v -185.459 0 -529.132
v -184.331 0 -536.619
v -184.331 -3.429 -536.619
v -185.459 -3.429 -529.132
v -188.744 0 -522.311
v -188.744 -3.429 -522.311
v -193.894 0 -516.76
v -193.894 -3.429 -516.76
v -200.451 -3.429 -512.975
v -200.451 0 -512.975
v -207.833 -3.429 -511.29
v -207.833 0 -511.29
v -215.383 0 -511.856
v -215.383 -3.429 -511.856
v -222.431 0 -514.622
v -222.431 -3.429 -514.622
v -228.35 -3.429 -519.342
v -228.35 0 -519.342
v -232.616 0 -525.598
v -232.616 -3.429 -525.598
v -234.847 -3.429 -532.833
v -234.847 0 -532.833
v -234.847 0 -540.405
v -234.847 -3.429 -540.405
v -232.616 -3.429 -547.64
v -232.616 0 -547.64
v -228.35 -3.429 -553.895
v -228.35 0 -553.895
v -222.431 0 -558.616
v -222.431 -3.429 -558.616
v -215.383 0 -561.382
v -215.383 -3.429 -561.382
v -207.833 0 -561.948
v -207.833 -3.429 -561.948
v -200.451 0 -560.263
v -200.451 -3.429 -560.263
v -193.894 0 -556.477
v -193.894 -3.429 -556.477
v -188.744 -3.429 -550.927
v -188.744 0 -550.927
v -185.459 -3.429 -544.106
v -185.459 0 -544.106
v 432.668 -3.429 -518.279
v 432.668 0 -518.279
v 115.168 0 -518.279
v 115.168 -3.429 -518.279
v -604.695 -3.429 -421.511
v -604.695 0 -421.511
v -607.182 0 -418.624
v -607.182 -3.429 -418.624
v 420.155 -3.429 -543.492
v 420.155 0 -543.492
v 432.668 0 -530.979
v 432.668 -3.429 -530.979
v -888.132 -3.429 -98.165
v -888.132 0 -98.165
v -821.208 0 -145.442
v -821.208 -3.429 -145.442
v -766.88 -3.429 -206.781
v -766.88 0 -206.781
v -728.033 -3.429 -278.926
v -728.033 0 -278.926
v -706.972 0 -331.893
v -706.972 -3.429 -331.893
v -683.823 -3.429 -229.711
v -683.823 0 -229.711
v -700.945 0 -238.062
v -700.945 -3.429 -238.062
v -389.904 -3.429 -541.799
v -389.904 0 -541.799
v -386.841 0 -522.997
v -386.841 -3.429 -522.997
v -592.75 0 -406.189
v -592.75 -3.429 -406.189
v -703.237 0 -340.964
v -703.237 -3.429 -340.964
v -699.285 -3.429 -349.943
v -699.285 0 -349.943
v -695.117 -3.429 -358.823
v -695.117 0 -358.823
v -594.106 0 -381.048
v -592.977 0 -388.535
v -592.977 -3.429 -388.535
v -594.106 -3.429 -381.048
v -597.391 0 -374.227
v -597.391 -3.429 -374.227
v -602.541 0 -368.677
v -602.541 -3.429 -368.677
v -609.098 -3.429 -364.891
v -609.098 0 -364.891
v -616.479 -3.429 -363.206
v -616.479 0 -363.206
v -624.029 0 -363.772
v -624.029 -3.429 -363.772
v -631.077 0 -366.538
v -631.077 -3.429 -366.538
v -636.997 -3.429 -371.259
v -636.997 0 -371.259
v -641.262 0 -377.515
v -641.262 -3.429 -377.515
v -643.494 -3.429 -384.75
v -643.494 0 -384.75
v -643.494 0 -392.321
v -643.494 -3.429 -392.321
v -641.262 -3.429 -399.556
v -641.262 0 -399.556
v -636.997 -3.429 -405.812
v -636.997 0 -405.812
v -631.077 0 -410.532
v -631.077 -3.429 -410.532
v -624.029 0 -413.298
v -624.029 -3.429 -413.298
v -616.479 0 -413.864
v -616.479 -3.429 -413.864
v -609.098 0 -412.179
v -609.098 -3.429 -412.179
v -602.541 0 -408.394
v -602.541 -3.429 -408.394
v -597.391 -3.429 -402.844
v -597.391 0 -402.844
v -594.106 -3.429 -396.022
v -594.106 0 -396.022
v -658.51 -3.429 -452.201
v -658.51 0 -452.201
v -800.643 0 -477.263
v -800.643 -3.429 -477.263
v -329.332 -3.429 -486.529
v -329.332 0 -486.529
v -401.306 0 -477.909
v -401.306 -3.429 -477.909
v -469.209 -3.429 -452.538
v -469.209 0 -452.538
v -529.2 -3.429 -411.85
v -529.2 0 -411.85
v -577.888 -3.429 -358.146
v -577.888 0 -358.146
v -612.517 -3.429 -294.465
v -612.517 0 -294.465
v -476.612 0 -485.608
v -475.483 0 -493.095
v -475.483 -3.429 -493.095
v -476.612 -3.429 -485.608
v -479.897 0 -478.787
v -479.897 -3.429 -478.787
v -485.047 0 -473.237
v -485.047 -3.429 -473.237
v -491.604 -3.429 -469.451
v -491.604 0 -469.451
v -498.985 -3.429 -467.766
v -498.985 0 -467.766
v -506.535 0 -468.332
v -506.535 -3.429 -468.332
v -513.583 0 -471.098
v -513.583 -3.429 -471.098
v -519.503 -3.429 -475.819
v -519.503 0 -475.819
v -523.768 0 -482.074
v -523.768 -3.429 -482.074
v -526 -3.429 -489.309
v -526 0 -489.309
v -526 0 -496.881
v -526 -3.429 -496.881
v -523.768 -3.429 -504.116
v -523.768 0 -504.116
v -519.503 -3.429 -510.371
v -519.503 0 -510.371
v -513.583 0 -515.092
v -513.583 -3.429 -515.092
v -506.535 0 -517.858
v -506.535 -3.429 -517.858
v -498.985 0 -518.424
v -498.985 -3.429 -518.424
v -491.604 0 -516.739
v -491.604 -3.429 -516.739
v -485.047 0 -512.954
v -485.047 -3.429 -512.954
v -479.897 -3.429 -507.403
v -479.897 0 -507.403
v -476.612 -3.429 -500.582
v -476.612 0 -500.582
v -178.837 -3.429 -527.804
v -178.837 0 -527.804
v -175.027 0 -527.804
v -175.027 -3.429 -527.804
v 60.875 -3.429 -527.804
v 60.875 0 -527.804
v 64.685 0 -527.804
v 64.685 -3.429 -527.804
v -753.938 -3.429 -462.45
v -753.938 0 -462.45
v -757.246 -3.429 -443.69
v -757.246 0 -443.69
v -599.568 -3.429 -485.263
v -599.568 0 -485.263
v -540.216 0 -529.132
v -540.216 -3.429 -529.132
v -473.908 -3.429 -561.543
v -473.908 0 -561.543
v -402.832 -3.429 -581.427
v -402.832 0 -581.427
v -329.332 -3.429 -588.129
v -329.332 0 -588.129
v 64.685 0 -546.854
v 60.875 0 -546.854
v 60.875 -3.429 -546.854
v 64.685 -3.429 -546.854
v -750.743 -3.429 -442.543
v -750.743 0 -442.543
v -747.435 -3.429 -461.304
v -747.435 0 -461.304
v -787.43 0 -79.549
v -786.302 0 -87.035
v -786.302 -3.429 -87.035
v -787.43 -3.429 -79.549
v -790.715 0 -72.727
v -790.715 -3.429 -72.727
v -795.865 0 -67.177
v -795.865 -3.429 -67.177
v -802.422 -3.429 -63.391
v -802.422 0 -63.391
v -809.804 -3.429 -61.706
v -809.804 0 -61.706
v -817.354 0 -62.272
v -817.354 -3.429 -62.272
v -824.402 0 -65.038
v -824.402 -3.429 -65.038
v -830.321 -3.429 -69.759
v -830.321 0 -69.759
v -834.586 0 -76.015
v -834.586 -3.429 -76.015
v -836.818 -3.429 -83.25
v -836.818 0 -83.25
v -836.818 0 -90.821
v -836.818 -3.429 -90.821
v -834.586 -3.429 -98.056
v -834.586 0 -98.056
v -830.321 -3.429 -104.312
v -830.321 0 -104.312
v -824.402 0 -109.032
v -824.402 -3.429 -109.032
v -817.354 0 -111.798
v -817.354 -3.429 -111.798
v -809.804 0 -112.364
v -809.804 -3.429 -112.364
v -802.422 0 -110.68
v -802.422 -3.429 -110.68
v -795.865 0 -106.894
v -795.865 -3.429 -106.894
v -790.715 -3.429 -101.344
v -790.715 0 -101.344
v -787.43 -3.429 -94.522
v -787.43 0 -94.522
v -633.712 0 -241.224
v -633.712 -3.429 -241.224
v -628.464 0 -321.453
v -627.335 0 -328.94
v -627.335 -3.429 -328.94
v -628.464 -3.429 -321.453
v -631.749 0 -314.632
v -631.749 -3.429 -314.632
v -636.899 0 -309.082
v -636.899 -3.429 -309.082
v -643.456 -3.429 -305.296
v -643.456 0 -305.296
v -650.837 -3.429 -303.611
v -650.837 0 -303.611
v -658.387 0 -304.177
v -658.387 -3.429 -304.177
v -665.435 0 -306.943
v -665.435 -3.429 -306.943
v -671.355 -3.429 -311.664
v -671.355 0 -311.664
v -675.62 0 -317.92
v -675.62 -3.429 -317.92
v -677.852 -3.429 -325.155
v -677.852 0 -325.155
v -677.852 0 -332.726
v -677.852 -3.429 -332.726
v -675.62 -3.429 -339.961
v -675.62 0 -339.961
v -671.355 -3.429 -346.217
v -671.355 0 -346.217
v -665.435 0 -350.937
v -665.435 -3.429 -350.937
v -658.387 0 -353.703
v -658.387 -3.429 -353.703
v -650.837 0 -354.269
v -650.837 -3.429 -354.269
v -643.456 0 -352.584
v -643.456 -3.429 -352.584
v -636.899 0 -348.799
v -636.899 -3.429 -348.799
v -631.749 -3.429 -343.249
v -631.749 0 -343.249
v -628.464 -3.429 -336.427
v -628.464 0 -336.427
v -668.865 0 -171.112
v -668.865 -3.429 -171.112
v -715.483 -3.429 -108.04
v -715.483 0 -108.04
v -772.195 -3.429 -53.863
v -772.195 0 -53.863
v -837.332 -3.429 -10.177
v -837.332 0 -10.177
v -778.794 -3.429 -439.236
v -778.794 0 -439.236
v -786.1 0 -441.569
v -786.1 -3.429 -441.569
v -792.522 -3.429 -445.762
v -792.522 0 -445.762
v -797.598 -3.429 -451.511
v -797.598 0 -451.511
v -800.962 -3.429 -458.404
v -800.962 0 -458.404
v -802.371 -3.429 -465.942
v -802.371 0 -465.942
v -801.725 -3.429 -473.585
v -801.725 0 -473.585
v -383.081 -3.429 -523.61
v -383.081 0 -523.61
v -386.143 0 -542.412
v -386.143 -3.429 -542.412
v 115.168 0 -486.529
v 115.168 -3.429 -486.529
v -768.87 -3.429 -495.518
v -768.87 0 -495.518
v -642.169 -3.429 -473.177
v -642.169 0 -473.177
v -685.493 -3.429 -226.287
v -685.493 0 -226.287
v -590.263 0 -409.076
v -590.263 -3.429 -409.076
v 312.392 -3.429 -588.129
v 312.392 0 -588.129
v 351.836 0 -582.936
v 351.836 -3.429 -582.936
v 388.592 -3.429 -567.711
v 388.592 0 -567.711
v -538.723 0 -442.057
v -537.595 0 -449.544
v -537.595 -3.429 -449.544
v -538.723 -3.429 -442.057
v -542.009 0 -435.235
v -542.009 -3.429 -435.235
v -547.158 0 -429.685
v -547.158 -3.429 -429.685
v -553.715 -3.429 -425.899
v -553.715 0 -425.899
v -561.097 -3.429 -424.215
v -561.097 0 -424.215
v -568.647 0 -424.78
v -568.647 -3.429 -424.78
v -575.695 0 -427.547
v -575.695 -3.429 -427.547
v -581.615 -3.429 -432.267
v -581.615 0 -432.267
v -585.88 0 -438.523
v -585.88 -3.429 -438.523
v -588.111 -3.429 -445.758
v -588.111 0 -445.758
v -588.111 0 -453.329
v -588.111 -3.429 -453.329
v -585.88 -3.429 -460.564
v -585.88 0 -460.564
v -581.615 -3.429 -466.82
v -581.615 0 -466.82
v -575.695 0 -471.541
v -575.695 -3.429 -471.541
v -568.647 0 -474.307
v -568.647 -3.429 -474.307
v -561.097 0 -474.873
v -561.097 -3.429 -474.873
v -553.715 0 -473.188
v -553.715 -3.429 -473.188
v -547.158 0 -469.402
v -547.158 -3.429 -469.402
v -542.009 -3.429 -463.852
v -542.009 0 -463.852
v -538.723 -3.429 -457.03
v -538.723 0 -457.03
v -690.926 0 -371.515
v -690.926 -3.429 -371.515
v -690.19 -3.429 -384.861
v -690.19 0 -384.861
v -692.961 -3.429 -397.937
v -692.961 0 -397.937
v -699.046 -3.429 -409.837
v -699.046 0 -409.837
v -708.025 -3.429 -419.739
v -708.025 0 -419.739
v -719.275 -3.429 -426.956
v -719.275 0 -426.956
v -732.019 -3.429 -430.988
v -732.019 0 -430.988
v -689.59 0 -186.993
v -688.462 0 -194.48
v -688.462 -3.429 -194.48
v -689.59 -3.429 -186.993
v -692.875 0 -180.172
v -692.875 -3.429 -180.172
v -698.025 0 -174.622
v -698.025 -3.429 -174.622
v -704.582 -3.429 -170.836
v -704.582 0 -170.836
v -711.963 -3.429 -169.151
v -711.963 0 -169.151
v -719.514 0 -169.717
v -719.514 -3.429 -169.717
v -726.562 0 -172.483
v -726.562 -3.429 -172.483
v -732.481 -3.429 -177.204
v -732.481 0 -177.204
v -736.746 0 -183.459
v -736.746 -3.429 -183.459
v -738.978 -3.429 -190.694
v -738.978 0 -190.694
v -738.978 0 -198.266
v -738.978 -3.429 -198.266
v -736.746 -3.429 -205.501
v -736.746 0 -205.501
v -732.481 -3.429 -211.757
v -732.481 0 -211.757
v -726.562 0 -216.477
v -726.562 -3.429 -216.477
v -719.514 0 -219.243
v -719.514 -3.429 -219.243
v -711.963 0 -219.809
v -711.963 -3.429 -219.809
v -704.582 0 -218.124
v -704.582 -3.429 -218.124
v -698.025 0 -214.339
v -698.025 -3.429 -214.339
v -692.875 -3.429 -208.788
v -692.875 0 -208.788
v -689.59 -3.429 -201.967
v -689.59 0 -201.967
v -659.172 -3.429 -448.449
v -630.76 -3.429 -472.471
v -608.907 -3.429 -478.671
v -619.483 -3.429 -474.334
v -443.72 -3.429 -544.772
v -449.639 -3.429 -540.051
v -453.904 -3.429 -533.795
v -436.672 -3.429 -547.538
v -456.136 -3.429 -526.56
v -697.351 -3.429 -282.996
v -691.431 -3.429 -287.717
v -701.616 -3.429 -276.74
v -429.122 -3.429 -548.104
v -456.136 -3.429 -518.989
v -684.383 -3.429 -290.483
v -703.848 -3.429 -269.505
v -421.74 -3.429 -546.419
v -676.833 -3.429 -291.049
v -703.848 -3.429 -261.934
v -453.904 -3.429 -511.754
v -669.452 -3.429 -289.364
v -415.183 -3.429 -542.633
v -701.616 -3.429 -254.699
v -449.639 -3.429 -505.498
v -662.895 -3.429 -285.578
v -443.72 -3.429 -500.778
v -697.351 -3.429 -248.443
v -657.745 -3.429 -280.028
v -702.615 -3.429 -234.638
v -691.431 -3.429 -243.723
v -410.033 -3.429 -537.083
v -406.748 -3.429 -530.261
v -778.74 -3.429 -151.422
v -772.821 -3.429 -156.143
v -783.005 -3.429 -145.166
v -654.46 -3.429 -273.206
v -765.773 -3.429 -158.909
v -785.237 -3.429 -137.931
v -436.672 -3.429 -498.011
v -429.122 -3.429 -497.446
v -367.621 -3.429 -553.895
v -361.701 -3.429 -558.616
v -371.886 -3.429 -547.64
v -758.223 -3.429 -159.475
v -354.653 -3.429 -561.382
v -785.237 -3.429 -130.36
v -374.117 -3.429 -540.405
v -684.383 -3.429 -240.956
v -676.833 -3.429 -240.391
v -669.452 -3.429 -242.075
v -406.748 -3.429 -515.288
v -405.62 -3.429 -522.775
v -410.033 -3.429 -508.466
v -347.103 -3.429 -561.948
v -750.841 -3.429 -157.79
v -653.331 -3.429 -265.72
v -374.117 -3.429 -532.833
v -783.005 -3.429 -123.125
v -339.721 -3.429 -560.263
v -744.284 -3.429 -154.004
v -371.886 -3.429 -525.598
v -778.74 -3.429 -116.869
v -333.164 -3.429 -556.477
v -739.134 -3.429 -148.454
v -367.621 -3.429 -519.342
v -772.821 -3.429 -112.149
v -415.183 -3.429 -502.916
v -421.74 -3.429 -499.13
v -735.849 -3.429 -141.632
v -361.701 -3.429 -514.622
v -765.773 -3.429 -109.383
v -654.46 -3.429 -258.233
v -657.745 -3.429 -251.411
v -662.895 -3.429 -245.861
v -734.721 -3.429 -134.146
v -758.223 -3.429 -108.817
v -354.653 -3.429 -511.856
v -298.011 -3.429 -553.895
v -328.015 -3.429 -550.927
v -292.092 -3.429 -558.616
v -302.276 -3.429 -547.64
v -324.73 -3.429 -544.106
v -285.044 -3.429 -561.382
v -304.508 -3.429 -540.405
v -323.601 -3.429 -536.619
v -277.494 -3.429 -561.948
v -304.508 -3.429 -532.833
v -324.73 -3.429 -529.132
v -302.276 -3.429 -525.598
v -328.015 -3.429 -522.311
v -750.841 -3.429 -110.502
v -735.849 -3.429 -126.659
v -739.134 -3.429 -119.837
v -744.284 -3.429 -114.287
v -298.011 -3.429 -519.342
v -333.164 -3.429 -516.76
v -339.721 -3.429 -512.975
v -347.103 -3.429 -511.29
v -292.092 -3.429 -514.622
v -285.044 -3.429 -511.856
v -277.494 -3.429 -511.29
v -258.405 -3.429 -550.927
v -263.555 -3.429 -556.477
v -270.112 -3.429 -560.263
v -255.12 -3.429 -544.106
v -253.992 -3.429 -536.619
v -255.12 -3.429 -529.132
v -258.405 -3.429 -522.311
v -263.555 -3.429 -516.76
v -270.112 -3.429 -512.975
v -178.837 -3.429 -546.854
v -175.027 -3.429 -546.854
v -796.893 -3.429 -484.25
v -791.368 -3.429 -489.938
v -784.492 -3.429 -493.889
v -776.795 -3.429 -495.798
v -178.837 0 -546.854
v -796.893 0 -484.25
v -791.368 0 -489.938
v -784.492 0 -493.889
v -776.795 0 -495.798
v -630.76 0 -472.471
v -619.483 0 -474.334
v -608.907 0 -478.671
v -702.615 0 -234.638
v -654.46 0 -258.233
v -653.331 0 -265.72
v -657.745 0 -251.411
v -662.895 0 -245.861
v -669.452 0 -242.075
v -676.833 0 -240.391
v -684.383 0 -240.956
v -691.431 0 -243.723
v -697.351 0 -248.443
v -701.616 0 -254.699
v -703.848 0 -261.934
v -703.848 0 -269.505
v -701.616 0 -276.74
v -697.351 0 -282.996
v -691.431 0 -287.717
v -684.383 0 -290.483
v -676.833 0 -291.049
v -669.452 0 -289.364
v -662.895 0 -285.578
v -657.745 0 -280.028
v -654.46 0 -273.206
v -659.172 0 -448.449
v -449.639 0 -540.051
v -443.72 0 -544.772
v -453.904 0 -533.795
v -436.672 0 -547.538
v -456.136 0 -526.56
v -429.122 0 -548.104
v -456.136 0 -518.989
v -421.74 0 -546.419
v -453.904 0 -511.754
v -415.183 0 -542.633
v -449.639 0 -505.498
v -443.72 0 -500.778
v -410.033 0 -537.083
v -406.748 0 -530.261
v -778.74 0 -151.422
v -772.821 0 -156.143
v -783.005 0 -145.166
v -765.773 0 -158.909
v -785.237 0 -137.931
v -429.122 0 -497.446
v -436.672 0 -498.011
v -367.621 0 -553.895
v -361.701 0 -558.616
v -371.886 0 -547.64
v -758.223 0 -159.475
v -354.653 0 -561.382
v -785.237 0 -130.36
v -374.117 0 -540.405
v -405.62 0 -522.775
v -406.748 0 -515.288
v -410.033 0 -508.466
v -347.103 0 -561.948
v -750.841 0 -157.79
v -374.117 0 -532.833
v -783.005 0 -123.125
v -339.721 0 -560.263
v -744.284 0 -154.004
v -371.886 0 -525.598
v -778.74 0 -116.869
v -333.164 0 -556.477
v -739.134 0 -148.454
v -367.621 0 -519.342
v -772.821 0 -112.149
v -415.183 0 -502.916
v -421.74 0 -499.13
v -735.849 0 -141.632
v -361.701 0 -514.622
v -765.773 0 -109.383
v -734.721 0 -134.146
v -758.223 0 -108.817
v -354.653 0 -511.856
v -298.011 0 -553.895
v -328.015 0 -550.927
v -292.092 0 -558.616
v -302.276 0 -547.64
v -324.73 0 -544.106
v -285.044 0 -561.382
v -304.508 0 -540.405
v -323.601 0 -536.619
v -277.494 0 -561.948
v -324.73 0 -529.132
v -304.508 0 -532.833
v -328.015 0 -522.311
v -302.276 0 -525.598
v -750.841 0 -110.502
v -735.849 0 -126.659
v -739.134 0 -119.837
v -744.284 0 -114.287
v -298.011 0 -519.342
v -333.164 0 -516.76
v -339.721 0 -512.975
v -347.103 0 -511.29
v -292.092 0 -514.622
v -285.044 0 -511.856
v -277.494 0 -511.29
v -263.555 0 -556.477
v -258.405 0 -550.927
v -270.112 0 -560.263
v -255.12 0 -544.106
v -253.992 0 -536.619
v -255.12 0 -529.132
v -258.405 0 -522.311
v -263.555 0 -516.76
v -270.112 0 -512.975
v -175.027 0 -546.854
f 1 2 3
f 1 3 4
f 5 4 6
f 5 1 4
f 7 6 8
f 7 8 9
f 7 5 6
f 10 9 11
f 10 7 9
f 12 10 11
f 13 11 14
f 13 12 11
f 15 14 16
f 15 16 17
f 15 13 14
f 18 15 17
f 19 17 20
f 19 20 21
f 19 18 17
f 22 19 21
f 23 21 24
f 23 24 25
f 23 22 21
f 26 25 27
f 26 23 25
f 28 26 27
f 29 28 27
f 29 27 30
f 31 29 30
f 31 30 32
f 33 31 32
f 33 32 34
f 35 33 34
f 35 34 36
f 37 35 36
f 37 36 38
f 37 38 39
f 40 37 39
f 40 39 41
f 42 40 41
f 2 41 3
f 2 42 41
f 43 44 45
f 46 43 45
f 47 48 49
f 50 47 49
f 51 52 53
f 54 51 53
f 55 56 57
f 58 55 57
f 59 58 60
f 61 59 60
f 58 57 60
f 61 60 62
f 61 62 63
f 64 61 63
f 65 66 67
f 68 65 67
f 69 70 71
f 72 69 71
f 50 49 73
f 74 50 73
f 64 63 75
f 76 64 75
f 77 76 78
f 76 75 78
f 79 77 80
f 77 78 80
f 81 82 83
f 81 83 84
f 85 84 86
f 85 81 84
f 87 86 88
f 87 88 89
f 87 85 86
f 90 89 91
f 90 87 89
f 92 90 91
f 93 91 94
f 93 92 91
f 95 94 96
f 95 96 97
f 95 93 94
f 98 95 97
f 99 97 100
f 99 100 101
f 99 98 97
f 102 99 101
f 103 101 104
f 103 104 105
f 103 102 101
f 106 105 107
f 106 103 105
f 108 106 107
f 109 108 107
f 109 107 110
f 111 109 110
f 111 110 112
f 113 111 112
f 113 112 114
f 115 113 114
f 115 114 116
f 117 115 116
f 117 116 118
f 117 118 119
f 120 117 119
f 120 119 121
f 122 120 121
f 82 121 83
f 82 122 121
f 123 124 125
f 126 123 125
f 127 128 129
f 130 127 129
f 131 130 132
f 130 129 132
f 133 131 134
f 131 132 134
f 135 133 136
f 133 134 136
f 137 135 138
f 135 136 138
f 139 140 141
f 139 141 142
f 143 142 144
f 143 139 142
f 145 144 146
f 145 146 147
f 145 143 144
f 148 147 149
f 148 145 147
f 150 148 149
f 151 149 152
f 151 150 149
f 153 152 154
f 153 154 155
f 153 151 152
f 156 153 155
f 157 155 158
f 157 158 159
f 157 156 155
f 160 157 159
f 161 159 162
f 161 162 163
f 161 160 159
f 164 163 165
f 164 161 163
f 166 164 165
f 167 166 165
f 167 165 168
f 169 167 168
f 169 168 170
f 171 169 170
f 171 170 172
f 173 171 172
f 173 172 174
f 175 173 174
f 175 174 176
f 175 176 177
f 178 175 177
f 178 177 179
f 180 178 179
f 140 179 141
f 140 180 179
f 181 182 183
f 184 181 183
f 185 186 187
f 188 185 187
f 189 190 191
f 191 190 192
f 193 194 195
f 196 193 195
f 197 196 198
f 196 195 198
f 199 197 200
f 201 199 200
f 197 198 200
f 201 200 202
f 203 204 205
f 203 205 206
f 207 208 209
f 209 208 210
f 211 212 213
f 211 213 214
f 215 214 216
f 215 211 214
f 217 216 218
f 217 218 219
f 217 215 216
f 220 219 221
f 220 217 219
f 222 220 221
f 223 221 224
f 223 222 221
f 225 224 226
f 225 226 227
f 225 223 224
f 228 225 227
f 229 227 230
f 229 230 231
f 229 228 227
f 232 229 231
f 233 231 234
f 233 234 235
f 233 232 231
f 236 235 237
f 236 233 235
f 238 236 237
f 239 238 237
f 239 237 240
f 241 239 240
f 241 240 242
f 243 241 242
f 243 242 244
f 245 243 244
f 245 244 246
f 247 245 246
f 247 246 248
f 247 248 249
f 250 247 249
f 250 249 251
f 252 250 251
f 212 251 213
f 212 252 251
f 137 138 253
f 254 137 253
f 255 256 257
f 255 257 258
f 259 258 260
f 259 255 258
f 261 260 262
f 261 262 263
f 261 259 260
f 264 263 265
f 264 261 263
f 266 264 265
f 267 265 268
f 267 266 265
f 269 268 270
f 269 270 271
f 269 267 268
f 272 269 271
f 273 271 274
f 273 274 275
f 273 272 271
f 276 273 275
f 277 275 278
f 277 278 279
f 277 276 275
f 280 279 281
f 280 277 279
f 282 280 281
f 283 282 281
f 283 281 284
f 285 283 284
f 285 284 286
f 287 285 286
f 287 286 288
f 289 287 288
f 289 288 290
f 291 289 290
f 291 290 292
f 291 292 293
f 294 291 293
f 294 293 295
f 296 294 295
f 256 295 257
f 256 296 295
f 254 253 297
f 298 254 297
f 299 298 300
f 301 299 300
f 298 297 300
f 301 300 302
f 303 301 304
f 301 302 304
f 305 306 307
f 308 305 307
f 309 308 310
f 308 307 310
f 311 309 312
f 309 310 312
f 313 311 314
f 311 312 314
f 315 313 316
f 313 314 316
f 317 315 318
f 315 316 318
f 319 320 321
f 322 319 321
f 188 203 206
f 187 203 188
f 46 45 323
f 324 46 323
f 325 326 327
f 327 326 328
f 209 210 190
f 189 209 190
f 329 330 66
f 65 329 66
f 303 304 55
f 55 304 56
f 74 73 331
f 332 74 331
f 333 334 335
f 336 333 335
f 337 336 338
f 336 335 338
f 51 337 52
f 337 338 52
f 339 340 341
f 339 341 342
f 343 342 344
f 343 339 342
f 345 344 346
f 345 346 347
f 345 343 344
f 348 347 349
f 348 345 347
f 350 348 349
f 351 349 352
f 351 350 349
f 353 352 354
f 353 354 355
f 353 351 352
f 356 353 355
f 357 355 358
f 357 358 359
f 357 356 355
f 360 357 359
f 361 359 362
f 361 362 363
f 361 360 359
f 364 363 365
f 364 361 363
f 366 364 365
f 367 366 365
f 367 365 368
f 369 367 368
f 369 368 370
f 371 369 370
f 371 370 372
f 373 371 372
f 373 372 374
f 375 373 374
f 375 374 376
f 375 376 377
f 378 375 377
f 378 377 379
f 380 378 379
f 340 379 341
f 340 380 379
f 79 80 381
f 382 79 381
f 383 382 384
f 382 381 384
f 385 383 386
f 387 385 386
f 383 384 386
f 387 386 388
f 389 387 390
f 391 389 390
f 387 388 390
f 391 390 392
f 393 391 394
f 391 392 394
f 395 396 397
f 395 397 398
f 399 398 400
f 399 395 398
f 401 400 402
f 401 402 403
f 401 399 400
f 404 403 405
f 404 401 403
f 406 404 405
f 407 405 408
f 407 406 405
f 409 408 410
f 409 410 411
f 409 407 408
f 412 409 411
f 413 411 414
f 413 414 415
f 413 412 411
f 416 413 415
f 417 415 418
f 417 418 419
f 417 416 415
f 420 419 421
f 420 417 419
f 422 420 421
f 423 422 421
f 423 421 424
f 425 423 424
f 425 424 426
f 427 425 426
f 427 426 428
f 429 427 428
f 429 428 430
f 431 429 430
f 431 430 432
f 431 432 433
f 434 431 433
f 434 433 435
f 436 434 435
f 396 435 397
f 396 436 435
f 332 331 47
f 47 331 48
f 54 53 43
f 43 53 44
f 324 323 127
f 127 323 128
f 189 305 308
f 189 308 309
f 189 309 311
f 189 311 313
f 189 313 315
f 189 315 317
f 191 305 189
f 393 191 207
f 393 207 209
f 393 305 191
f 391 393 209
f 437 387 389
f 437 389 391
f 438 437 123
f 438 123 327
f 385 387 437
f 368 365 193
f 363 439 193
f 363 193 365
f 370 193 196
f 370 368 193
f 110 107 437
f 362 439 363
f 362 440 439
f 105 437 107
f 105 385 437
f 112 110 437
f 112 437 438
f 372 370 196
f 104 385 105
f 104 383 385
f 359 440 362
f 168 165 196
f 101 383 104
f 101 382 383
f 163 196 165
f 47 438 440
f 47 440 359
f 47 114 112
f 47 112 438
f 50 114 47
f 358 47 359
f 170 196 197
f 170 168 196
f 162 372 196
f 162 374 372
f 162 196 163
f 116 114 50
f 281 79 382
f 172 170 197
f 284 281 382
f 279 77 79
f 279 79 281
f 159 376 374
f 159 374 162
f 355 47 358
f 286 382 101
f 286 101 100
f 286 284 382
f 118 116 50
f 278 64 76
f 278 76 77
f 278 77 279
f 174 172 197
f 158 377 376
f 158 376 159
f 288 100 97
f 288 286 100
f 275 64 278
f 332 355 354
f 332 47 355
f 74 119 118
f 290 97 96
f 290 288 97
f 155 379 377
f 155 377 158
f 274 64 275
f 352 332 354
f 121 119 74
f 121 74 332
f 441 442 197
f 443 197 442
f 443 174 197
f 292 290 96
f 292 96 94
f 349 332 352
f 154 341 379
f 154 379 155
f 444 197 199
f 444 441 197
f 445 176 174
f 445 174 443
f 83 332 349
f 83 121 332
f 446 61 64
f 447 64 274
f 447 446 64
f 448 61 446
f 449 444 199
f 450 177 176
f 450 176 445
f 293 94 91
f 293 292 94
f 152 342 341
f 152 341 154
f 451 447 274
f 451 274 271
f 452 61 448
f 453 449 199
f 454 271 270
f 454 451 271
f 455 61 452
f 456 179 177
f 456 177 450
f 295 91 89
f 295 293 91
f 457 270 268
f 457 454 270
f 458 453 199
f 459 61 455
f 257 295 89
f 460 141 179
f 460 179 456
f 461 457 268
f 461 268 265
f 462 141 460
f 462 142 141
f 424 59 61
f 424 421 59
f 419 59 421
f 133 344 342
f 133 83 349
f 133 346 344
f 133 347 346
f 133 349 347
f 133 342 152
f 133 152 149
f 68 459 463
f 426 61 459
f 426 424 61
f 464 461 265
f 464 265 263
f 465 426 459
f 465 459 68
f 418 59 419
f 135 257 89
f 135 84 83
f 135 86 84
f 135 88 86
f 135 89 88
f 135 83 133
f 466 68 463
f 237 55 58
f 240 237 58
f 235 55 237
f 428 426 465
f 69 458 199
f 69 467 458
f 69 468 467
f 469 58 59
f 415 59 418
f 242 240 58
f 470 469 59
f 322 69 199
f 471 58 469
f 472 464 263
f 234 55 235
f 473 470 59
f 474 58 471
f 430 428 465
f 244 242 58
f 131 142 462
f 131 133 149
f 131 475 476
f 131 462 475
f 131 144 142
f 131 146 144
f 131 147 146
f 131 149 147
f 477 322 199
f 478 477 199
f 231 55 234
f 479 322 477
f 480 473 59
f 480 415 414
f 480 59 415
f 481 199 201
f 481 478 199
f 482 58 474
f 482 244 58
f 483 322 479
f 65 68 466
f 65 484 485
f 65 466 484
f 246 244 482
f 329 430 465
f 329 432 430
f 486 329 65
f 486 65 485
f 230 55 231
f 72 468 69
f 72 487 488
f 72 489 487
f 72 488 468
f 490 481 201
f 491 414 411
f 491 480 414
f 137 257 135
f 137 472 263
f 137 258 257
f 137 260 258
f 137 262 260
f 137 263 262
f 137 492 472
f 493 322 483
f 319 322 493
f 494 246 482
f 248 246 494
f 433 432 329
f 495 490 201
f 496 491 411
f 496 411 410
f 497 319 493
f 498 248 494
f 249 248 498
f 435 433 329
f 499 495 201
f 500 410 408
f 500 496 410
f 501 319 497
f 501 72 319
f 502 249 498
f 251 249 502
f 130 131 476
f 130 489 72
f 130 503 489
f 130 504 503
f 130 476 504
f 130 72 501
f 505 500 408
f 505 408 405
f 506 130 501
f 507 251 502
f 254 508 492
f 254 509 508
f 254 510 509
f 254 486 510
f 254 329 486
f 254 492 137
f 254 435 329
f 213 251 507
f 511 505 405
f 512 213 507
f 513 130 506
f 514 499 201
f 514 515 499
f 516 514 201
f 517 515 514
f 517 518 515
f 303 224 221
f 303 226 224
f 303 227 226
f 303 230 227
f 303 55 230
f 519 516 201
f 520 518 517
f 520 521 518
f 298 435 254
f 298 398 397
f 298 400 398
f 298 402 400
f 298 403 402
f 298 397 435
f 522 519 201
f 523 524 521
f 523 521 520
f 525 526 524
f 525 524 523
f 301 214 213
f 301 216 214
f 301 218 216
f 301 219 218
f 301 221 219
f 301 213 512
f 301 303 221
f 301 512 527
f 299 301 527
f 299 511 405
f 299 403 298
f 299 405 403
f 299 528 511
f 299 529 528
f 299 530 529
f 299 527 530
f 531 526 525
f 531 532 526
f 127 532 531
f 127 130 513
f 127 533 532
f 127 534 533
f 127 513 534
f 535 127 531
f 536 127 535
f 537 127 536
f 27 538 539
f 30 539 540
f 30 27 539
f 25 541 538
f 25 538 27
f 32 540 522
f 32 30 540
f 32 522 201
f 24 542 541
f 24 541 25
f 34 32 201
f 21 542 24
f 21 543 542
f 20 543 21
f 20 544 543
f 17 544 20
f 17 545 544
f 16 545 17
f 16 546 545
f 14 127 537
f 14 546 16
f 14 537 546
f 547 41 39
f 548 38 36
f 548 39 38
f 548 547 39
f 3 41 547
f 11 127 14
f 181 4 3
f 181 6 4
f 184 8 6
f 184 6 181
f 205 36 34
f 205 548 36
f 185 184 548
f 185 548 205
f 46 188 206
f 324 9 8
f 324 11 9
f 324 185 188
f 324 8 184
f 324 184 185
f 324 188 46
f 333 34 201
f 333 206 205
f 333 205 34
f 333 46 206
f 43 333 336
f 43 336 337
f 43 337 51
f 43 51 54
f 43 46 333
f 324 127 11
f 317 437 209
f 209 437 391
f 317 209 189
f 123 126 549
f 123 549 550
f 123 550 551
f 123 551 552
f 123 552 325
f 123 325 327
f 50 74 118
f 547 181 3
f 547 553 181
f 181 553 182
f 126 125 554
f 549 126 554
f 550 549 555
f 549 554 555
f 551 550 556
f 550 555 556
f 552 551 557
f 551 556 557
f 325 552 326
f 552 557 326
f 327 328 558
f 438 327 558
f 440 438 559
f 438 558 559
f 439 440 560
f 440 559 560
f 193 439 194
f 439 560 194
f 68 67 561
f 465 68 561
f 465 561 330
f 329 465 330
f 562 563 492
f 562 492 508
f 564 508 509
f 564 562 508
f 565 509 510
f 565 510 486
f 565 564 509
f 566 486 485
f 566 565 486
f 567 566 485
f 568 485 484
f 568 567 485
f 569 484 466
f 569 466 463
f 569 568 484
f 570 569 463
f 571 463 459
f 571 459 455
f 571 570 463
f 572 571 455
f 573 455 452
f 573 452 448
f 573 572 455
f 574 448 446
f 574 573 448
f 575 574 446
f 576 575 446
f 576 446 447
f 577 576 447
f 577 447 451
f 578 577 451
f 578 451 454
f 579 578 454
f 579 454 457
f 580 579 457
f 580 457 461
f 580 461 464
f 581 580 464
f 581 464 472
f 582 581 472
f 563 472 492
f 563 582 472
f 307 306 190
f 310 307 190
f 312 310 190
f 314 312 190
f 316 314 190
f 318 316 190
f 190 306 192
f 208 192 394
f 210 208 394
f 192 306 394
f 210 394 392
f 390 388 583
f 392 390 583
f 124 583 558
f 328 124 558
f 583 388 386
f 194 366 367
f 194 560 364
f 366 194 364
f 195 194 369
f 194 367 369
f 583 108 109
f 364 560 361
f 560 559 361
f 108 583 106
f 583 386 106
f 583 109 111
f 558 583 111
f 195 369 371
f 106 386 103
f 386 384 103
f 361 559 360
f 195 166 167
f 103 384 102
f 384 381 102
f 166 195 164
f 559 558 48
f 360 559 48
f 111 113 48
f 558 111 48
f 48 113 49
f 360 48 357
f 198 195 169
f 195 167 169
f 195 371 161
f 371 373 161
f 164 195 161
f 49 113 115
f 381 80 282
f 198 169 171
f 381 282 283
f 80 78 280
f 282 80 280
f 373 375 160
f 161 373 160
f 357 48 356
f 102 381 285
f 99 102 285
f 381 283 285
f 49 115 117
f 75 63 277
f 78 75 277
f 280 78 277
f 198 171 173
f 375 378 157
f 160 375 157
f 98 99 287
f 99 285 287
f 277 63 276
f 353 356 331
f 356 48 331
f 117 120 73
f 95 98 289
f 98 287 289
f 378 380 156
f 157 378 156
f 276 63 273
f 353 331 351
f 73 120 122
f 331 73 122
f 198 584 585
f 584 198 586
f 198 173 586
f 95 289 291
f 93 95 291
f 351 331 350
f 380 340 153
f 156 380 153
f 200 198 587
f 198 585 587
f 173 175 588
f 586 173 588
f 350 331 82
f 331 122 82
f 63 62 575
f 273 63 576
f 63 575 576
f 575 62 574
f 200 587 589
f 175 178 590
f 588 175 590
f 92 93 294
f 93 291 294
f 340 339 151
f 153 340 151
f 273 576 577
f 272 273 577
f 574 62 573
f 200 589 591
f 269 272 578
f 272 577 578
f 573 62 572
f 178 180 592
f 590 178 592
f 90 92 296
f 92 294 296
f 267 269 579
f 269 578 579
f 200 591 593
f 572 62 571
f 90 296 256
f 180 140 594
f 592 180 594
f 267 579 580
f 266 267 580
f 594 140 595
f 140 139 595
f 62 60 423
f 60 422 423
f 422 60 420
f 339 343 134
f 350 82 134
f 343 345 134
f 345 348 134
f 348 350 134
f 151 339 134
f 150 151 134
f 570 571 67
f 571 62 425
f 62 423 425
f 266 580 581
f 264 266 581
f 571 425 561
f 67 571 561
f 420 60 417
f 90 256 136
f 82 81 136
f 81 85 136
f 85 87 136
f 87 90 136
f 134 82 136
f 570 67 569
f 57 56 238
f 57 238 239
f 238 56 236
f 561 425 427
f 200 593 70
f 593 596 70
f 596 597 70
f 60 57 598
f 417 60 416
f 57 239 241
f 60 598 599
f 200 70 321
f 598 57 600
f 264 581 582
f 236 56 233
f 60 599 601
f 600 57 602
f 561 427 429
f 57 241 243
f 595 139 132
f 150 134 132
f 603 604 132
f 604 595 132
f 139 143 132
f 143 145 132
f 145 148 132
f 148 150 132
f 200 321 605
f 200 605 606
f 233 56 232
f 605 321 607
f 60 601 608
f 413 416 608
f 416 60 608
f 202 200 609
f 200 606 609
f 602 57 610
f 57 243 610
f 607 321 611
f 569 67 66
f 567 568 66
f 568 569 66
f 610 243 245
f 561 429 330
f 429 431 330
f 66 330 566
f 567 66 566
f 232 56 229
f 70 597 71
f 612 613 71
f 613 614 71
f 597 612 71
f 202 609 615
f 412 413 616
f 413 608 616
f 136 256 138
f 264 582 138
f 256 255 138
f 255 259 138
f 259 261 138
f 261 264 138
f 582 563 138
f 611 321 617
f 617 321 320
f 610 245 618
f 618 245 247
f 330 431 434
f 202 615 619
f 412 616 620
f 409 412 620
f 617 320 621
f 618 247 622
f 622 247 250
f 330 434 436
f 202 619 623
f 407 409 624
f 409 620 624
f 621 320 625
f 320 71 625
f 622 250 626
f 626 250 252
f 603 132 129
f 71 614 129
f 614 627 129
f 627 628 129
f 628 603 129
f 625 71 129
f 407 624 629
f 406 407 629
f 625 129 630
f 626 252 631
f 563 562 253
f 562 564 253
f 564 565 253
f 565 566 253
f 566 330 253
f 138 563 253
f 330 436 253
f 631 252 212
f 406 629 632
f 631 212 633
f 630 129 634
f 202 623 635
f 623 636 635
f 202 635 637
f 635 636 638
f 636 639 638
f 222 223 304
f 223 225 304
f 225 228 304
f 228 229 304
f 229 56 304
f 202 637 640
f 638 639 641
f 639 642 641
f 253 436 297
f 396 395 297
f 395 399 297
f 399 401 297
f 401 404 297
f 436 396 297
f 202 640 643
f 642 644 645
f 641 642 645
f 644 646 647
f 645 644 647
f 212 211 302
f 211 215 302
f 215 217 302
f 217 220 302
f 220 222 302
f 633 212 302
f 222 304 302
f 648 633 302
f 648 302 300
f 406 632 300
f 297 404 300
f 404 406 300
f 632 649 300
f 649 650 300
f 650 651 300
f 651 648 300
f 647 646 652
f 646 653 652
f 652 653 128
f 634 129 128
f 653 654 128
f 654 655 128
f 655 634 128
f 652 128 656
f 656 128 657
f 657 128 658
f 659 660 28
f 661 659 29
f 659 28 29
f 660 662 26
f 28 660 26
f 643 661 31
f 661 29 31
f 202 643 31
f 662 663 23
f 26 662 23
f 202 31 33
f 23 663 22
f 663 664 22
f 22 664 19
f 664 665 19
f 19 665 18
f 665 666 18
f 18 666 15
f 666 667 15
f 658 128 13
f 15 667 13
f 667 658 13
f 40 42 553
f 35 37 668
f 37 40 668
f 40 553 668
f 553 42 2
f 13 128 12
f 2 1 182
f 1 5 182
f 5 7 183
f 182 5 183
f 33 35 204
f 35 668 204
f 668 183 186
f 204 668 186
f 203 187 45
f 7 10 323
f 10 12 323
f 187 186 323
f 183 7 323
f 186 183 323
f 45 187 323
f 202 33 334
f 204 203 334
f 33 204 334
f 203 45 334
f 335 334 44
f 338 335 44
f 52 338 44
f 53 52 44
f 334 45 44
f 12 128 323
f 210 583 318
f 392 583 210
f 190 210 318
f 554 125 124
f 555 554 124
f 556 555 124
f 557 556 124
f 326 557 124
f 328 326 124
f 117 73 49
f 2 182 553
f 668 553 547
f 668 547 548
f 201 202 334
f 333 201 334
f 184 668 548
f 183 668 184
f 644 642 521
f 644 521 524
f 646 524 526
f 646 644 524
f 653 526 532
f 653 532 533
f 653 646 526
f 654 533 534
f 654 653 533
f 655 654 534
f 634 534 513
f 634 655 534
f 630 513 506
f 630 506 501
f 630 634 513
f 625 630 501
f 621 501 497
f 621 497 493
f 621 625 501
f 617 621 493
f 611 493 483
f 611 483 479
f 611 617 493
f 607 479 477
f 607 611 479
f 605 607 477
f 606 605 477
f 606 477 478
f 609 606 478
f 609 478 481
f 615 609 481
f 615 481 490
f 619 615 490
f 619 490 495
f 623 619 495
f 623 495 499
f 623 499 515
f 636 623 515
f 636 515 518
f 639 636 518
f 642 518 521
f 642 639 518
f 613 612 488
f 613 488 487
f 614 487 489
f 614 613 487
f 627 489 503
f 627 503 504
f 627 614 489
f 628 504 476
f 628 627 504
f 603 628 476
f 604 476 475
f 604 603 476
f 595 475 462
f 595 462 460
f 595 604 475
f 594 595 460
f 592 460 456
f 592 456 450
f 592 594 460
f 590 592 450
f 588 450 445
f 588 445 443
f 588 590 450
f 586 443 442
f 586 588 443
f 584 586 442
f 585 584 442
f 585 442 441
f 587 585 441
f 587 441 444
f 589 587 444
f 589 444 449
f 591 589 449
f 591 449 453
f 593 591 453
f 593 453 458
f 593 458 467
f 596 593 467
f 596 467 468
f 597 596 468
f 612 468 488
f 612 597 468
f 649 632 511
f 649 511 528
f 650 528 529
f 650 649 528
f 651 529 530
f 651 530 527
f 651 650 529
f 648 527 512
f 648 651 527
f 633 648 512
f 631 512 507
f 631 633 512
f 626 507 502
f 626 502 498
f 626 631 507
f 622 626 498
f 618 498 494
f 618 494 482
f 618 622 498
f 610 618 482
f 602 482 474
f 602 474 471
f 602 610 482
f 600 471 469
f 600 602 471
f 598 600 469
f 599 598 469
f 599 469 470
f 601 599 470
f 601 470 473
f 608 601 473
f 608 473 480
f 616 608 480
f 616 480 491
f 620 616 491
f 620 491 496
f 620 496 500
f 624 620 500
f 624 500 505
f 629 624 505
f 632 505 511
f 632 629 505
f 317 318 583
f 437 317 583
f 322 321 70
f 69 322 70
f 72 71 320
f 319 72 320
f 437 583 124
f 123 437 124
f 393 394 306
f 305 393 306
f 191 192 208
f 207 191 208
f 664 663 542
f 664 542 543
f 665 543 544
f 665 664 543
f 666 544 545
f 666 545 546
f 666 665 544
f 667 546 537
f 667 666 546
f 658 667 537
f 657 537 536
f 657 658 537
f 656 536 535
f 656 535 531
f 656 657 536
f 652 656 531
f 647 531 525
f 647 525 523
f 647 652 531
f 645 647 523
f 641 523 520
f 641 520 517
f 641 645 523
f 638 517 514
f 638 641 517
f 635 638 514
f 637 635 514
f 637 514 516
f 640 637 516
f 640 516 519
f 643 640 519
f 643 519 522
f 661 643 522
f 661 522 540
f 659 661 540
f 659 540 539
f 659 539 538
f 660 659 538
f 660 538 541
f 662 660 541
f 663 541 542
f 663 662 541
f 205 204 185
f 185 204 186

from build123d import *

# Parameters (mm, degrees)
F0_R     = 25.4
F0_W     = 3.81
F0_H     = 19.05
F1_DEPTH = 3.429


# Not quite as in the source:
# - ends of sketch curves that miss each other by under 0.0002 mm in the source are joined


with BuildPart() as f1:
    # F0 (on Front) → F1 (new body)
    with BuildSketch(Plane.XZ):
        with BuildLine():
            ThreePointArc((-642.1692497265, -473.1768646252), (-619.4825639758, -474.3339275445), (-599.5683960075, -485.2632650852))
            ThreePointArc((-599.5683960075, -485.2632650852), (-473.9081608396, -561.5426017902), (-329.3321582, -588.1285164))
            Line((-329.3321582, -588.1285164), (312.391679, -588.1285164))
            ThreePointArc((312.391679, -588.1285164), (370.7126340924, -576.5277571547), (420.1547524528, -543.4915898528))
            Line((420.1547524528, -543.4915898528), (432.6678418, -530.9785164))
            Line((432.6678418, -530.9785164), (432.6678418, -518.2785164))
            Line((432.6678418, -518.2785164), (115.1678418, -518.2785164))
            Line((115.1678418, -518.2785164), (115.1678418, -486.5285164))
            Line((115.1678418, -486.5285164), (-329.3321582, -486.5285164))
            ThreePointArc((-329.3321582, -486.5285164), (-500.4183293998, -433.9834708096), (-612.5167665735, -294.4650126217))
            Line((-612.5167665735, -294.4650126217), (-633.7122454, -241.2238))
            ThreePointArc((-633.7122454, -241.2238), (-715.4828245955, -108.0397407431), (-837.3321571082, -10.1767620246))
            Line((-837.3321571082, -10.1767620246), (-888.1321582, -98.1649548))
            ThreePointArc((-888.1321582, -98.1649548), (-792.2711581527, -174.5413586603), (-728.0333576386, -278.9261845185))
            Line((-728.0333576386, -278.9261845185), (-706.971662, -331.8929862))
            ThreePointArc((-706.971662, -331.8929862), (-701.288086285, -345.465340488), (-695.1169115223, -358.8230511462))
            ThreePointArc((-695.1169115223, -358.8230511462), (-695.6103607346, -404.0881567784), (-732.0186808394, -430.9880994311))
            Line((-732.0186808394, -430.9880994311), (-778.7941498, -439.2359008))
            ThreePointArc((-778.7941498, -439.2359008), (-797.5979576606, -451.5111596623), (-801.724697479, -473.5845717908))
            Line((-801.724697479, -473.5845717908), (-659.172037, -448.448684))
            Line((-659.172037, -448.448684), (-658.5104432, -452.2007974))
            Line((-658.5104432, -452.2007974), (-800.6426456, -477.2625456))
            ThreePointArc((-800.6426456, -477.2625456), (-788.0677244467, -492.1533513081), (-768.8701676538, -495.5176466233))
            Line((-768.8701676538, -495.5176466233), (-642.1692497265, -473.1768646252))
        make_face()
        Polygon((-753.9383956, -462.4504086), (-757.24639, -443.6898162), (-750.74272, -442.543057), (-747.4347256, -461.3036494), align=None, mode=Mode.SUBTRACT)
        with Locations((-562.9950386, -449.5436526)):
            Circle(F0_R, mode=Mode.SUBTRACT)
        with Locations((-431.0197374, -522.7745704)):
            Circle(F0_R, mode=Mode.SUBTRACT)
        with Locations((-349.0011308, -536.6188658)):
            Circle(F0_R, mode=Mode.SUBTRACT)
        Polygon((-383.0809204, -523.6095192), (-386.1430682, -542.411793), (-389.9035128, -541.7993482), (-386.841365, -522.9970744), align=None, mode=Mode.SUBTRACT)
        with Locations((-279.3916688, -536.6188658)):
            Circle(F0_R, mode=Mode.SUBTRACT)
        with Locations((-500.8834026, -493.095026)):
            Circle(F0_R, mode=Mode.SUBTRACT)
        Polygon((-590.2629546, -409.075509), (-604.6945742, -421.510587), (-607.1815898, -418.624258), (-592.7499702, -406.1892054), align=None, mode=Mode.SUBTRACT)
        with Locations((-618.3772494, -388.5352402)):
            Circle(F0_R, mode=Mode.SUBTRACT)
        with Locations((-652.7354484, -328.9401854)):
            Circle(F0_R, mode=Mode.SUBTRACT)
        with Locations((-209.7308988, -536.6188658)):
            Circle(F0_R, mode=Mode.SUBTRACT)
        with Locations((-176.9321582, -537.3285164)):
            Rectangle(F0_W, F0_H, mode=Mode.SUBTRACT)
        with Locations((62.7803418, -537.3285164)):
            Rectangle(F0_W, F0_H, mode=Mode.SUBTRACT)
        with Locations((-678.731434, -265.7196362)):
            Circle(F0_R, mode=Mode.SUBTRACT)
        Polygon((-683.8231434, -229.7111992), (-700.9451564, -238.0621858), (-702.6153588, -234.6377832), (-685.4933458, -226.2867966), align=None, mode=Mode.SUBTRACT)
        with Locations((-713.8615898, -194.4801292)):
            Circle(F0_R, mode=Mode.SUBTRACT)
        with Locations((-760.120654, -134.1457058)):
            Circle(F0_R, mode=Mode.SUBTRACT)
        with Locations((-811.7017548, -87.0353098)):
            Circle(F0_R, mode=Mode.SUBTRACT)
    extrude(amount=F1_DEPTH)


solid = f1.part
